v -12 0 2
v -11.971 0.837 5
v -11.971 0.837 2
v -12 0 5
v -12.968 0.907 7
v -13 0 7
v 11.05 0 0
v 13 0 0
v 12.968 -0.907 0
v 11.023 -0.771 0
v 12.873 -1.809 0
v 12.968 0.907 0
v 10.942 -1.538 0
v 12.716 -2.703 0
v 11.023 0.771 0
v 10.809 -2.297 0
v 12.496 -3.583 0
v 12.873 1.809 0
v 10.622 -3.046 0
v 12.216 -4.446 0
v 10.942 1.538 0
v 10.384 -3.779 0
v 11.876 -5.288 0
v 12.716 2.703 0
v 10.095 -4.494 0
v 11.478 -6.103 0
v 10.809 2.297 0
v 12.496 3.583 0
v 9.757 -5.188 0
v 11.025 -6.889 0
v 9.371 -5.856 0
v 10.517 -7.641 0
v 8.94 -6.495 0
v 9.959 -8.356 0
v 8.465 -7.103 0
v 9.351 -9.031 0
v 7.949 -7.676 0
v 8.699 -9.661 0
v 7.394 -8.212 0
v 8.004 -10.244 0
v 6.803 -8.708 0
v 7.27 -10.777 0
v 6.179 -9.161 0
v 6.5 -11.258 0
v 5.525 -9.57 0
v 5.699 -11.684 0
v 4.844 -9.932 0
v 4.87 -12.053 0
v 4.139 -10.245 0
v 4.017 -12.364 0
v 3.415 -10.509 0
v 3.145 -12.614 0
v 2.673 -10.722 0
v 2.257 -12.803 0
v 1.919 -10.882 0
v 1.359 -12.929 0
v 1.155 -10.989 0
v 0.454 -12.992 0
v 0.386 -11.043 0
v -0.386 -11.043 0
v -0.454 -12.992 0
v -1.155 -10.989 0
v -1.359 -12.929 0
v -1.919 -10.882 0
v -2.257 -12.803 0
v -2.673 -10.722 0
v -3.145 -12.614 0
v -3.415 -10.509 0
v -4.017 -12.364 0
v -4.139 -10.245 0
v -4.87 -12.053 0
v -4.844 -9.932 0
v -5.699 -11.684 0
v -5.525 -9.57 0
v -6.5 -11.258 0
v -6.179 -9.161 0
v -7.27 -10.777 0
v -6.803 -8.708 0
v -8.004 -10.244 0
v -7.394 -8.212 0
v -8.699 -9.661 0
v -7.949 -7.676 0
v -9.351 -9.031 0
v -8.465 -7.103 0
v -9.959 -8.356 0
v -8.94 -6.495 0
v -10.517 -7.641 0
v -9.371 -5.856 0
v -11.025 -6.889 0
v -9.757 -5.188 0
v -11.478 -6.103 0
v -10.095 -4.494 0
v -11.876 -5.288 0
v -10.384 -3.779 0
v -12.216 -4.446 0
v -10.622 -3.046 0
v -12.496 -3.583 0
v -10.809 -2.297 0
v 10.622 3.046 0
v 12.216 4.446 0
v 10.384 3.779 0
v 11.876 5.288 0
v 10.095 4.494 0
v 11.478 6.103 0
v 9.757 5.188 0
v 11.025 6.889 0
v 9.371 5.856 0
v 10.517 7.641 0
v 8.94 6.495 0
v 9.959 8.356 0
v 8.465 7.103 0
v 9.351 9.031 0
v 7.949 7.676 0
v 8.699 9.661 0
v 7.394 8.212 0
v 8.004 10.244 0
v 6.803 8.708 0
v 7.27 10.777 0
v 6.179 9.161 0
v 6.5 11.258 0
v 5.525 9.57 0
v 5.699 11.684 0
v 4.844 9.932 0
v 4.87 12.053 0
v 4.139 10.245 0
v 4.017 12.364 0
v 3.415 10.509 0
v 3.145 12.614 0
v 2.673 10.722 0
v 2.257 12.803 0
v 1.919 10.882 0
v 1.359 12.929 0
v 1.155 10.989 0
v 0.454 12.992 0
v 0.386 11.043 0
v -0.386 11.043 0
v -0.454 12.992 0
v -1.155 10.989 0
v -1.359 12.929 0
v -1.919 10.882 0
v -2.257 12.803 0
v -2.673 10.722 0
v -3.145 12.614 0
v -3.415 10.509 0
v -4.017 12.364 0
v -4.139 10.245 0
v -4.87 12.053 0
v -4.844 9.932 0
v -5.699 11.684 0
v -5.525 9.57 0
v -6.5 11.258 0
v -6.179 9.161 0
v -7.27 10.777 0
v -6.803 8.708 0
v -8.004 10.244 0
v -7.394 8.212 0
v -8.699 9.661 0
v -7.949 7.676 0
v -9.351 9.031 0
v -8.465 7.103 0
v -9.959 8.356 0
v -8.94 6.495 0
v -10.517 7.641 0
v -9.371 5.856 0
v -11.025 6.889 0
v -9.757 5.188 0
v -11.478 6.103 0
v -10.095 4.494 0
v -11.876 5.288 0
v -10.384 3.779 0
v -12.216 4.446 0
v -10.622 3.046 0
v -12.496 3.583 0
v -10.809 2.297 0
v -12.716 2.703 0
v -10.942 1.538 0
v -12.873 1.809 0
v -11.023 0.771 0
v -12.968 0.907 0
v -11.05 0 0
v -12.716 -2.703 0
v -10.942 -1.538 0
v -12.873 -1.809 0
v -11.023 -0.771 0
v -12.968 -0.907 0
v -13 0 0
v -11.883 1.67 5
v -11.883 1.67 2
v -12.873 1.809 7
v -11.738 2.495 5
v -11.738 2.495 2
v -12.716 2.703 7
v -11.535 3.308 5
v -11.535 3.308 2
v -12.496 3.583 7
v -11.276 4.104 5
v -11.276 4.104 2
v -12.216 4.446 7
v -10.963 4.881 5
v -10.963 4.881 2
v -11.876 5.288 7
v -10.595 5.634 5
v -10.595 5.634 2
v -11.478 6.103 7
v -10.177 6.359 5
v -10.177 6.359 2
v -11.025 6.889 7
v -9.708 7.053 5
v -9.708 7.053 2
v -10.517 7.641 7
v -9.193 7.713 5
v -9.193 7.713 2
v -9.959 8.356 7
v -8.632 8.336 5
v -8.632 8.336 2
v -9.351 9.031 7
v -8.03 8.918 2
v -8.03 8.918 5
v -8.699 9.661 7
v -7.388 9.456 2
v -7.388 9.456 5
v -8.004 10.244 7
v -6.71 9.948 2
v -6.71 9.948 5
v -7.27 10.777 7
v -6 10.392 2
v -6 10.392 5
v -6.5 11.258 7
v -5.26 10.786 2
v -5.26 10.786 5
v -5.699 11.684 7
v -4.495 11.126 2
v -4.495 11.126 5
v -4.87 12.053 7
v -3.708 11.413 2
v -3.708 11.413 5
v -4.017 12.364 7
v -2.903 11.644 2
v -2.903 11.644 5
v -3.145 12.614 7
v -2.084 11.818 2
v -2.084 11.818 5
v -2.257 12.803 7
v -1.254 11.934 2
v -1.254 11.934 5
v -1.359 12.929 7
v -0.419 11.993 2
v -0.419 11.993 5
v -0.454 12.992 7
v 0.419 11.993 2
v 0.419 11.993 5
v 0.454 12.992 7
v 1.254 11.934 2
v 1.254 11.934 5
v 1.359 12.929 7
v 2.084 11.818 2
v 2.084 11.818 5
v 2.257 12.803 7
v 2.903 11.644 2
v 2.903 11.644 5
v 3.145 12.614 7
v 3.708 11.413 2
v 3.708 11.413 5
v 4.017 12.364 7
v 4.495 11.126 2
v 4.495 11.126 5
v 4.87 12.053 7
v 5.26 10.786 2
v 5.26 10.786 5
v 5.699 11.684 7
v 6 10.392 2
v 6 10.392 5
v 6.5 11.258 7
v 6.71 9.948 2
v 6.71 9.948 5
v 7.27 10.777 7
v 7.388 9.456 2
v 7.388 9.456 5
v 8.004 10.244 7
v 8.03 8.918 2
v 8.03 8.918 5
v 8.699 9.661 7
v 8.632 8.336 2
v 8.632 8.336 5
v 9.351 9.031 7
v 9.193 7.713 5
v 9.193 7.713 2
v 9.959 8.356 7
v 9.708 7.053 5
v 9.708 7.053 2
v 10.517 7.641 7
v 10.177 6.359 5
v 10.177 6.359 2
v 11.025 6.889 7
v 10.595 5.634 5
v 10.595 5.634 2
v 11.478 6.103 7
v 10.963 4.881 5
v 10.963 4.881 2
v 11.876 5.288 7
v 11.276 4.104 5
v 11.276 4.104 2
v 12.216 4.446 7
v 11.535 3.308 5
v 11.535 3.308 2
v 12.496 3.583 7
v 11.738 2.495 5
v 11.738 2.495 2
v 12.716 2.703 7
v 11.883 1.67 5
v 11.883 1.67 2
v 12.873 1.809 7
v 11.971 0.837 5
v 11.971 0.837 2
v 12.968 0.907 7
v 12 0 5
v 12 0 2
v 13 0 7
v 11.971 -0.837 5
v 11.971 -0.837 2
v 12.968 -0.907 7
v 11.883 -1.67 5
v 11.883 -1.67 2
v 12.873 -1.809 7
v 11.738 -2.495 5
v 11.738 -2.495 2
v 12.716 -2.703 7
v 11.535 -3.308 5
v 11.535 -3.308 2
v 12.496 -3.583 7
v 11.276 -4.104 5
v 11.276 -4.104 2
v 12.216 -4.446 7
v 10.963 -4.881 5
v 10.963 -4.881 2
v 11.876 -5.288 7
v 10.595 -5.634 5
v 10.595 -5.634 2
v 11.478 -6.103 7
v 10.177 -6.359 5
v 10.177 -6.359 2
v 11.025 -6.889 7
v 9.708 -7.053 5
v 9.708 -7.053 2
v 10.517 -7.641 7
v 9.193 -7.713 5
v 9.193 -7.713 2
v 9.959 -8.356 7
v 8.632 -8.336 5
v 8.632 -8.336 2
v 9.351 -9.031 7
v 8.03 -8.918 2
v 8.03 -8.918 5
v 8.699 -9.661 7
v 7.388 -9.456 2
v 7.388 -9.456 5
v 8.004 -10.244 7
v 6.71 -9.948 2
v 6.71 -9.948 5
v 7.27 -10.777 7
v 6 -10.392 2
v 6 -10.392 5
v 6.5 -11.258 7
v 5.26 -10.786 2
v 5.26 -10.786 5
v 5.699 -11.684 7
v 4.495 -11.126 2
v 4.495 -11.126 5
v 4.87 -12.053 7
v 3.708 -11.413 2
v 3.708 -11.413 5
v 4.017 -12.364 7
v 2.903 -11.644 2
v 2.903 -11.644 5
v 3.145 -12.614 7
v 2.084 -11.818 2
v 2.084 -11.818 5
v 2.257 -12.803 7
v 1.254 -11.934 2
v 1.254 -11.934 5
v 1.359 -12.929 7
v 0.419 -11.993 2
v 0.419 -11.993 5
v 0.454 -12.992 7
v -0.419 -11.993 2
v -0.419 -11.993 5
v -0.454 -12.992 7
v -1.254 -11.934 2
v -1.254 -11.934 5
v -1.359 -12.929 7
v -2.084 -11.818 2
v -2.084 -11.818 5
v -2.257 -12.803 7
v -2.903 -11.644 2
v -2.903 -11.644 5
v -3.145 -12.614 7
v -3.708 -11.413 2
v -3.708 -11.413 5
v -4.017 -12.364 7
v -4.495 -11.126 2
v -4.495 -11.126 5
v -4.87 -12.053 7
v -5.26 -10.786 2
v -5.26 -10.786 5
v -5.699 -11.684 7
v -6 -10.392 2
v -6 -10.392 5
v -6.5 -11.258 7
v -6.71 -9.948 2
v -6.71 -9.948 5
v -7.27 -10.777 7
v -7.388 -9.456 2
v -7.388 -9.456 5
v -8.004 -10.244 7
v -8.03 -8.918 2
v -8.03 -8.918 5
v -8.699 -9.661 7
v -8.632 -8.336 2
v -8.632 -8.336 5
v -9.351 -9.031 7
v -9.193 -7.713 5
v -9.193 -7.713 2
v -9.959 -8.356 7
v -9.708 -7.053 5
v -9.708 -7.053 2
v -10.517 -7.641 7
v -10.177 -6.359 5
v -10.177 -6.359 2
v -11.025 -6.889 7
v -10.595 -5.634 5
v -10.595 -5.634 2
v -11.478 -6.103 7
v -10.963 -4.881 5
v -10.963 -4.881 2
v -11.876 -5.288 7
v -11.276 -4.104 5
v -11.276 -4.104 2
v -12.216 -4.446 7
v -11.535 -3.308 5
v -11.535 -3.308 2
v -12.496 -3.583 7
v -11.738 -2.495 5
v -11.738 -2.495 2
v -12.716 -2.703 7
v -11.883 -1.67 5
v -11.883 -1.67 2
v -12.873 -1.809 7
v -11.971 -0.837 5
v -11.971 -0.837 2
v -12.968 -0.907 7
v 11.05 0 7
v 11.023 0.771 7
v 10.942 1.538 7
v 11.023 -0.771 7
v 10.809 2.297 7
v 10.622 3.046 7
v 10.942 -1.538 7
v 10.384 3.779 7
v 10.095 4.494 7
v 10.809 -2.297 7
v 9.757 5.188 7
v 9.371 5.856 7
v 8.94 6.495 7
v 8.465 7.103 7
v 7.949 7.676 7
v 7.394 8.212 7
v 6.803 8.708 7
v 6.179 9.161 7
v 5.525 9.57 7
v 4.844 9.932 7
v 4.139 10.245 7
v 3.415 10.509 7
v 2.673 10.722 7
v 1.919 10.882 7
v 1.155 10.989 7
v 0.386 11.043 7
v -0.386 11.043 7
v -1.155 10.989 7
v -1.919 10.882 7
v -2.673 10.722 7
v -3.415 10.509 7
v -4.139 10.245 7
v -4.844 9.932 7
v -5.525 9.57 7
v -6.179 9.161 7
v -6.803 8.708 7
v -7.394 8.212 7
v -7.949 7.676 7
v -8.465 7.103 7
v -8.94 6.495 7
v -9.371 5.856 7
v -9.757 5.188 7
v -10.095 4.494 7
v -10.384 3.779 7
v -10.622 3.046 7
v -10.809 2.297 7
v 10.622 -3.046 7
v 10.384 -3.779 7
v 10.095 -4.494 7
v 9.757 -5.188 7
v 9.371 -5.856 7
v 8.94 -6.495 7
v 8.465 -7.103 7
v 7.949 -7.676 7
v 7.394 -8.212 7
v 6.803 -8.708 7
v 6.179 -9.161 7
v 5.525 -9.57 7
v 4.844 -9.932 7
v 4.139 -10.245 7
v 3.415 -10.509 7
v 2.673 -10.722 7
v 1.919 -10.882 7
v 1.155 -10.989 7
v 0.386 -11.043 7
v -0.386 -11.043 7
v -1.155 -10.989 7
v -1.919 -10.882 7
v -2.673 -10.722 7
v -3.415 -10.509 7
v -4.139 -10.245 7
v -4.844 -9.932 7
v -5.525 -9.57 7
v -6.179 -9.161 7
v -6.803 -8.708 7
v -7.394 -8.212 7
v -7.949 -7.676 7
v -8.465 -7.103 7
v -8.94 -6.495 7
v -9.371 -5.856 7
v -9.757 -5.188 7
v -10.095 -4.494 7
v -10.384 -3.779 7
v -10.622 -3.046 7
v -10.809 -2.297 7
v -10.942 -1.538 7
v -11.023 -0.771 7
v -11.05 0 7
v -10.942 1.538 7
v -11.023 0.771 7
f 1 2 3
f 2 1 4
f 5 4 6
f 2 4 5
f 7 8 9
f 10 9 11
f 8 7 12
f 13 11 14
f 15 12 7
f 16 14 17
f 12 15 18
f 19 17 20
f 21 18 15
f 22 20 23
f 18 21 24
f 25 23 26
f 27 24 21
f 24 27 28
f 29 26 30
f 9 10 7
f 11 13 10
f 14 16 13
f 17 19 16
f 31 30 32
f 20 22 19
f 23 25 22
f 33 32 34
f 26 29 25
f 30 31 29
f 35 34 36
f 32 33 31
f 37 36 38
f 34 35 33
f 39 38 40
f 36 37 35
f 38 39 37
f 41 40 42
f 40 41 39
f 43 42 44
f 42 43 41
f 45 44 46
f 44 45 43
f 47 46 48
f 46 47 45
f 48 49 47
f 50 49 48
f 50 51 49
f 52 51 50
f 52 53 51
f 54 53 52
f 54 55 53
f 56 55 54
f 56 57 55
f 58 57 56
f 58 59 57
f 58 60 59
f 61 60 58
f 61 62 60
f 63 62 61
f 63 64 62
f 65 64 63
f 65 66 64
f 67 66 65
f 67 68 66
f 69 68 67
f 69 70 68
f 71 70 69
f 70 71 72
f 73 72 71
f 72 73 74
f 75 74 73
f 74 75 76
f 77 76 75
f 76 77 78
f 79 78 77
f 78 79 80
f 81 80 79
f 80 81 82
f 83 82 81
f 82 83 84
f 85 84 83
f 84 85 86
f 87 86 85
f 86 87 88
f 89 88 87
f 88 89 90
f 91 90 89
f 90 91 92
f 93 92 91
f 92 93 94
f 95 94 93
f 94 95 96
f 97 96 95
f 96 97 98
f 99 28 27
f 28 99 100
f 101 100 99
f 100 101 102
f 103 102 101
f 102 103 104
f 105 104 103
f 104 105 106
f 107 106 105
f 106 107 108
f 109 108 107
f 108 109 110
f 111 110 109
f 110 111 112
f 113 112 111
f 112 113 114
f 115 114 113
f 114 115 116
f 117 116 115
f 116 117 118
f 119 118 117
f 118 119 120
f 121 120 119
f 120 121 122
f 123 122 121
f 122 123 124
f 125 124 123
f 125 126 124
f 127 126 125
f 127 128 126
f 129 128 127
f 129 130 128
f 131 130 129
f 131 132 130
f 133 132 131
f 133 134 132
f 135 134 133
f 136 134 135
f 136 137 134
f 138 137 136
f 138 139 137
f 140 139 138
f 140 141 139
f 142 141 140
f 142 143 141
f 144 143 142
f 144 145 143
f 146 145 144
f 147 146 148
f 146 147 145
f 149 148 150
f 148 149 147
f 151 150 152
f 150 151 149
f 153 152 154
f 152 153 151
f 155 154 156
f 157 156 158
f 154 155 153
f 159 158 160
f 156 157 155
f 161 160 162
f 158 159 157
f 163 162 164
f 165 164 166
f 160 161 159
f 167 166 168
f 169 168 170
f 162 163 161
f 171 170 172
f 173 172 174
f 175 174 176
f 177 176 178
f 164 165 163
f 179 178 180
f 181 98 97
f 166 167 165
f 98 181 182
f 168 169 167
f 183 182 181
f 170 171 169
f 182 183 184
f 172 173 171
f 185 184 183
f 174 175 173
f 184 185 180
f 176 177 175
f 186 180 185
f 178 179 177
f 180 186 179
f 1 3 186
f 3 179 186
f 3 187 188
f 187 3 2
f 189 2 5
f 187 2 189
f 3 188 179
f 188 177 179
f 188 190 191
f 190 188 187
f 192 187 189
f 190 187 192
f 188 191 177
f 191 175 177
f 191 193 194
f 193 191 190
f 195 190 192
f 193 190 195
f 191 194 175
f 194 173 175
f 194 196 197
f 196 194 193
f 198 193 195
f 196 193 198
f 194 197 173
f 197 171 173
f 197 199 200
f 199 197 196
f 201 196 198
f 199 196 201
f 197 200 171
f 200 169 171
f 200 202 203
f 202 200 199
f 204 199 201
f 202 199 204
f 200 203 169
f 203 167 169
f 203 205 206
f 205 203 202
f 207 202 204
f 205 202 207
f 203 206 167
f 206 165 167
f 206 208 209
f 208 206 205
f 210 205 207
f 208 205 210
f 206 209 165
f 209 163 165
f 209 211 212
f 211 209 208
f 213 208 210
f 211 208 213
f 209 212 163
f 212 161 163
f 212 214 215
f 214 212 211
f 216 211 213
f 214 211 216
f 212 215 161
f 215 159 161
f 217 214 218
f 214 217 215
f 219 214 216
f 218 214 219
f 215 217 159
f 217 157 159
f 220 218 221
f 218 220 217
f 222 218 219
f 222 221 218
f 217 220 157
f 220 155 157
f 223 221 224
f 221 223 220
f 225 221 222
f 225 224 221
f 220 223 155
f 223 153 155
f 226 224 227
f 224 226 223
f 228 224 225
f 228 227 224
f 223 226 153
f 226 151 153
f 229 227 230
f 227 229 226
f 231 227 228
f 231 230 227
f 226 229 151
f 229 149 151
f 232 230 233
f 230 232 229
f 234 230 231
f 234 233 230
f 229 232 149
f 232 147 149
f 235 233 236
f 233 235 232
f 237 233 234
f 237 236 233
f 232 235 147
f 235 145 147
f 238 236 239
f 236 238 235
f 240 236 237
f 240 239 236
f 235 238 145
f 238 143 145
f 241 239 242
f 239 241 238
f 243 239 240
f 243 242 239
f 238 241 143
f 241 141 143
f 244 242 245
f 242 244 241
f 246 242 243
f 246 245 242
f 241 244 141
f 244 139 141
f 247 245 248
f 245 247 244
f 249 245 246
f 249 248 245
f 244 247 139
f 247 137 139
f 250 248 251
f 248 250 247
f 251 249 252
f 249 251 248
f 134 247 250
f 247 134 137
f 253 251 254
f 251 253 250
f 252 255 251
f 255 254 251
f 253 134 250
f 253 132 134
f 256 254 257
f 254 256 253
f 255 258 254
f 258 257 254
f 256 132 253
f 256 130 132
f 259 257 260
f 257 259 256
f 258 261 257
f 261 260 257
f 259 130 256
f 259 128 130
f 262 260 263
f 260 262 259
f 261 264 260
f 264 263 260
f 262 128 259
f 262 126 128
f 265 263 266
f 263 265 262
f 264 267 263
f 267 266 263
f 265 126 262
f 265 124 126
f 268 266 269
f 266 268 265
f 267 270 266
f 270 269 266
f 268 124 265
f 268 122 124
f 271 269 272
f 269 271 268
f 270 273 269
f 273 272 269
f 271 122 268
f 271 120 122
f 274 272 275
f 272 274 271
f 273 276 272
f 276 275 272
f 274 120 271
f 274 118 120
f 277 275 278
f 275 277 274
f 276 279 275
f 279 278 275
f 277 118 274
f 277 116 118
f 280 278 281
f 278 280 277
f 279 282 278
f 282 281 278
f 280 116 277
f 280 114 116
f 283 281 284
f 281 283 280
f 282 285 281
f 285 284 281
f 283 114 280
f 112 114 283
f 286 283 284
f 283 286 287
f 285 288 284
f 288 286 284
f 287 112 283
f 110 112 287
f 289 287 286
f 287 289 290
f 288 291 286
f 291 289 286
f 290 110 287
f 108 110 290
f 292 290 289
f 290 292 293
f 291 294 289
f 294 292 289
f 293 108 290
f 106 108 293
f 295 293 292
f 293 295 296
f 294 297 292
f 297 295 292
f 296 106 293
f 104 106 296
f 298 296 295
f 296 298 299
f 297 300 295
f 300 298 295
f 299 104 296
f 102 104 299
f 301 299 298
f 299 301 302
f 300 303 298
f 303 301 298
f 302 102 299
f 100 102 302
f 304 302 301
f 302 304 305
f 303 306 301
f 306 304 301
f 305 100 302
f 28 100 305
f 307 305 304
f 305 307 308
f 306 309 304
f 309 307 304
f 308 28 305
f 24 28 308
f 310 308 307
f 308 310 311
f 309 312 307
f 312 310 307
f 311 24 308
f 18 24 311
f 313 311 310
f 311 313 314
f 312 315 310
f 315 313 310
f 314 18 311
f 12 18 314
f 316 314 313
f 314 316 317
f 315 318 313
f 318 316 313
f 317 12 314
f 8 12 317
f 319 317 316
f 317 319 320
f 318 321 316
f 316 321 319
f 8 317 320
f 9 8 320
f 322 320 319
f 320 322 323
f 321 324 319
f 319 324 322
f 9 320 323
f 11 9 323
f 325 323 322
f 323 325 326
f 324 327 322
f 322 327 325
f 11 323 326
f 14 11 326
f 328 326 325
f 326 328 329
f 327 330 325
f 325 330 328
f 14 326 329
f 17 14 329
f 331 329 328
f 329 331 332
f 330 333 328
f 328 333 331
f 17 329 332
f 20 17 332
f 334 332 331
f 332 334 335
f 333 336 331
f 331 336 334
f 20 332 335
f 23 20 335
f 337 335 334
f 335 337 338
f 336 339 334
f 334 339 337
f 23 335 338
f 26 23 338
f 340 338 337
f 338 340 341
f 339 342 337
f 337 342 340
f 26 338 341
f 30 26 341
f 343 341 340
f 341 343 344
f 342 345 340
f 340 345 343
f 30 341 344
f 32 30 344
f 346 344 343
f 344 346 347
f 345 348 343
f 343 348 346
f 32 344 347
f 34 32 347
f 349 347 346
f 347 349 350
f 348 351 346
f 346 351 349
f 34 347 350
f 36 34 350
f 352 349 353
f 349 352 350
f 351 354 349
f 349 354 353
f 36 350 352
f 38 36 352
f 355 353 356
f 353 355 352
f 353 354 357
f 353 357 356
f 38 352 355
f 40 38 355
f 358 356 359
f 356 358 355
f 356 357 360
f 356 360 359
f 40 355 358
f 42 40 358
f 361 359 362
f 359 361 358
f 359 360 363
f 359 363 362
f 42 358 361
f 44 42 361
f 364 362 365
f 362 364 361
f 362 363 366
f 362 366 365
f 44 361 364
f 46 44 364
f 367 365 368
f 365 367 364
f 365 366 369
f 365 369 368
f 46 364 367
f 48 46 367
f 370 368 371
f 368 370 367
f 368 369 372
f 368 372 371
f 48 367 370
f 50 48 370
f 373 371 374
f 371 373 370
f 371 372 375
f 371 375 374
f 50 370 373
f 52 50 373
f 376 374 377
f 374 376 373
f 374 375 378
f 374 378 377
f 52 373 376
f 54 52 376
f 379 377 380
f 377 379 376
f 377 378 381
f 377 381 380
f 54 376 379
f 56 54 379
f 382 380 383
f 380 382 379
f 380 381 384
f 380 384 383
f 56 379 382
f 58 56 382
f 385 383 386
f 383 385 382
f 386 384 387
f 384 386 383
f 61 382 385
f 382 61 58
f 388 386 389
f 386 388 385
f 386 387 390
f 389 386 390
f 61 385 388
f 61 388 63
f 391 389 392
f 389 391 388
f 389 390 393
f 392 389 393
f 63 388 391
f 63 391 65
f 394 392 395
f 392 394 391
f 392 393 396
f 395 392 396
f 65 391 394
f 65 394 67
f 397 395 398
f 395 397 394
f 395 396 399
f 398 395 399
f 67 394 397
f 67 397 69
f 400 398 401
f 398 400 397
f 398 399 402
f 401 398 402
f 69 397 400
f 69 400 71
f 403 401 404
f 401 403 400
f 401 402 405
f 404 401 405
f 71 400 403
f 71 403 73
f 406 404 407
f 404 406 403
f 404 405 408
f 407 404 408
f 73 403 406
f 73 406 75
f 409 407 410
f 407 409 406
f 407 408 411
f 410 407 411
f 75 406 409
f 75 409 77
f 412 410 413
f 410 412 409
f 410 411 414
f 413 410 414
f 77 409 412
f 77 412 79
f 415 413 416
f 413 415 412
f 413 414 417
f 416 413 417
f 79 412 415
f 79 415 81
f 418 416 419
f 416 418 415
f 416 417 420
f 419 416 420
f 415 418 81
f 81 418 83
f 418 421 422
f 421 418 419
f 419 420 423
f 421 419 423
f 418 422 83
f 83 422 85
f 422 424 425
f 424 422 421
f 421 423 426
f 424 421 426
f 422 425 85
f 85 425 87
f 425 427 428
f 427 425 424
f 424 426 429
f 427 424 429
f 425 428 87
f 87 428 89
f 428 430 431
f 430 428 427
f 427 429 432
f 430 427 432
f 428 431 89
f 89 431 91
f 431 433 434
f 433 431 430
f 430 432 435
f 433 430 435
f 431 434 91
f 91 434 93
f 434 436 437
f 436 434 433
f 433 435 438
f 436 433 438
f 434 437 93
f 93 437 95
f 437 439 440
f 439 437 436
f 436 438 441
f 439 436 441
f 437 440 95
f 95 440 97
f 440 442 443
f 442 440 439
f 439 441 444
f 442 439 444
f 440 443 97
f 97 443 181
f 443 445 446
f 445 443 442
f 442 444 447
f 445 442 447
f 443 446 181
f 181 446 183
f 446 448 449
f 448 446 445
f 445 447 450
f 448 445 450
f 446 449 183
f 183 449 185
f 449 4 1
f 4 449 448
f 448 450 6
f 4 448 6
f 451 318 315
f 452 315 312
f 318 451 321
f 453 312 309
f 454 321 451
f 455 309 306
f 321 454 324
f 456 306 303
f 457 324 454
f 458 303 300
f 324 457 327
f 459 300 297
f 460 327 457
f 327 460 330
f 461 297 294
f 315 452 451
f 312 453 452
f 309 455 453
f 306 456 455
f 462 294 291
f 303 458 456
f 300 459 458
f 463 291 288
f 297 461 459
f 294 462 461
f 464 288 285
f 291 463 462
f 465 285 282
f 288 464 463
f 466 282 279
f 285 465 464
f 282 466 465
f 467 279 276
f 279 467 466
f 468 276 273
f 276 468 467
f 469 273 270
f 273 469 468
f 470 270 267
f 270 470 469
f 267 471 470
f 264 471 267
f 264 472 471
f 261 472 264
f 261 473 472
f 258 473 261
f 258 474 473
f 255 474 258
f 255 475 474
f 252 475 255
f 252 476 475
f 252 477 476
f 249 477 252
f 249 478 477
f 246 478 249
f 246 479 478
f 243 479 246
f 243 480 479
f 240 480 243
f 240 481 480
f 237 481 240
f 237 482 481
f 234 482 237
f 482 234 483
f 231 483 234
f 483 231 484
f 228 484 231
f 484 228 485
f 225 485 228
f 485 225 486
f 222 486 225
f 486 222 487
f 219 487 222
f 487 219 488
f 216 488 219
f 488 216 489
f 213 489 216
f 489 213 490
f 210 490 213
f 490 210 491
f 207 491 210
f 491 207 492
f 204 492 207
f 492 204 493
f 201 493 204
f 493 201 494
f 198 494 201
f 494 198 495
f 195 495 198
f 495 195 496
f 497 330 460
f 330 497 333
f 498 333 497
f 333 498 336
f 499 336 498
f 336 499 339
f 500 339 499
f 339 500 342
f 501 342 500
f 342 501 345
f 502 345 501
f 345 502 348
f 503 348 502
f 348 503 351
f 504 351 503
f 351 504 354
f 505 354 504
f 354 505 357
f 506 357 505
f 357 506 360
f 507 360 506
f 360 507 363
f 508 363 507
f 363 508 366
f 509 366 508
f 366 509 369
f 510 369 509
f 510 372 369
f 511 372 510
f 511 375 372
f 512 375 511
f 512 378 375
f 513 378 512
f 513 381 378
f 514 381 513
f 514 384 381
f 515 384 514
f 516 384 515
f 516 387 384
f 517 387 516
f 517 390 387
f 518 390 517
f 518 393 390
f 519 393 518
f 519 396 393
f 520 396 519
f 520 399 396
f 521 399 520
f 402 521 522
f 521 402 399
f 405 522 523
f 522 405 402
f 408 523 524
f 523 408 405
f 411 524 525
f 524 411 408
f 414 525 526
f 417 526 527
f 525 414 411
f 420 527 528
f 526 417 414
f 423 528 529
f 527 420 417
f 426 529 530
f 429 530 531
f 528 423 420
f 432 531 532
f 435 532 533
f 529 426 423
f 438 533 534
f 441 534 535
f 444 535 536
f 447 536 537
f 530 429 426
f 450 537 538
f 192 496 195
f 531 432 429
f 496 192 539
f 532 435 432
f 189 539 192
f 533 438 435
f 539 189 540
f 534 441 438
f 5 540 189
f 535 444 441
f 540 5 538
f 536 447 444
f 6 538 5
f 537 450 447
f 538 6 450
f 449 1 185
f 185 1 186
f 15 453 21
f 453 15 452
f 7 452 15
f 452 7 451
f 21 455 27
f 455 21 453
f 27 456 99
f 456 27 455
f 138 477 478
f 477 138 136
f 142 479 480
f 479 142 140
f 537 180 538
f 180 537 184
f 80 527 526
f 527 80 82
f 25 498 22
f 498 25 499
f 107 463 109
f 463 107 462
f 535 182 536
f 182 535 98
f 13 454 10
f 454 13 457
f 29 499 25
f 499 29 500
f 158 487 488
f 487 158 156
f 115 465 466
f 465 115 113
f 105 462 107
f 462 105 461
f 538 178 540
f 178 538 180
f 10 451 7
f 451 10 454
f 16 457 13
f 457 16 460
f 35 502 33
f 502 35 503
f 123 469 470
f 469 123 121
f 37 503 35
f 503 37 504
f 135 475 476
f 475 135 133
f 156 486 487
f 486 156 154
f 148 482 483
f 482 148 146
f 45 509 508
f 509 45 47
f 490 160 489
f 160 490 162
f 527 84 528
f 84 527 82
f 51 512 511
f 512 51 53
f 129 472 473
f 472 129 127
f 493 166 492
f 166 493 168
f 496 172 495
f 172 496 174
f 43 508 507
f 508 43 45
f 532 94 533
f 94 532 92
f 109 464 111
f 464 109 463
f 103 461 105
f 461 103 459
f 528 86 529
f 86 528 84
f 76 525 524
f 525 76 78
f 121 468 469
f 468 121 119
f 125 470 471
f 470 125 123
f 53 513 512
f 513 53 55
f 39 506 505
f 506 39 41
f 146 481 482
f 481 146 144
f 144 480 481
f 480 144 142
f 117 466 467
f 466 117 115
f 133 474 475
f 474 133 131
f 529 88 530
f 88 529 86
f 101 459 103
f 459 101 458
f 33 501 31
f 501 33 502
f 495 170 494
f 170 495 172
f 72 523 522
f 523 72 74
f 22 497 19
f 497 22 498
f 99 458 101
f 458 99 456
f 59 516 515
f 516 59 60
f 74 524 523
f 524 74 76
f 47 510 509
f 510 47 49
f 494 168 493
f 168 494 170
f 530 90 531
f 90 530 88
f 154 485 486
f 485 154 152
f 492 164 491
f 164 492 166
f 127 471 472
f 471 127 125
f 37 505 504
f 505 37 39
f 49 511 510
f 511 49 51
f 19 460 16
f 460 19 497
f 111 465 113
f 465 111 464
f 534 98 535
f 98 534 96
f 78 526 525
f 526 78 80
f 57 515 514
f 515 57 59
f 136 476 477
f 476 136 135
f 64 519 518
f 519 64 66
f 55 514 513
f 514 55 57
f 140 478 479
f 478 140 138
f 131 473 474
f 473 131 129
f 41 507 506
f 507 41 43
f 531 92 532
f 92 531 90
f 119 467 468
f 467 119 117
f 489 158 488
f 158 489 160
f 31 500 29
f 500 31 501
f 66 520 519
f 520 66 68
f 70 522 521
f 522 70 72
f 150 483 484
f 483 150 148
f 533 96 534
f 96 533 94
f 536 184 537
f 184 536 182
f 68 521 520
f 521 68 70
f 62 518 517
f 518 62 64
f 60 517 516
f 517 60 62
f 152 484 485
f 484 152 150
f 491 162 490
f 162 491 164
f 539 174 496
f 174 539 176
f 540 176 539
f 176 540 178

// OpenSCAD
//od=22mm, id=8mm
//w=7mm
$fn=90;
difference() {
rotate_extrude() polygon(points=[
[0,0],
[0,7],
[13,7],
[12,5],
[12,2],
[13,0]
]);
cylinder(h=7,d=22.1);
}
